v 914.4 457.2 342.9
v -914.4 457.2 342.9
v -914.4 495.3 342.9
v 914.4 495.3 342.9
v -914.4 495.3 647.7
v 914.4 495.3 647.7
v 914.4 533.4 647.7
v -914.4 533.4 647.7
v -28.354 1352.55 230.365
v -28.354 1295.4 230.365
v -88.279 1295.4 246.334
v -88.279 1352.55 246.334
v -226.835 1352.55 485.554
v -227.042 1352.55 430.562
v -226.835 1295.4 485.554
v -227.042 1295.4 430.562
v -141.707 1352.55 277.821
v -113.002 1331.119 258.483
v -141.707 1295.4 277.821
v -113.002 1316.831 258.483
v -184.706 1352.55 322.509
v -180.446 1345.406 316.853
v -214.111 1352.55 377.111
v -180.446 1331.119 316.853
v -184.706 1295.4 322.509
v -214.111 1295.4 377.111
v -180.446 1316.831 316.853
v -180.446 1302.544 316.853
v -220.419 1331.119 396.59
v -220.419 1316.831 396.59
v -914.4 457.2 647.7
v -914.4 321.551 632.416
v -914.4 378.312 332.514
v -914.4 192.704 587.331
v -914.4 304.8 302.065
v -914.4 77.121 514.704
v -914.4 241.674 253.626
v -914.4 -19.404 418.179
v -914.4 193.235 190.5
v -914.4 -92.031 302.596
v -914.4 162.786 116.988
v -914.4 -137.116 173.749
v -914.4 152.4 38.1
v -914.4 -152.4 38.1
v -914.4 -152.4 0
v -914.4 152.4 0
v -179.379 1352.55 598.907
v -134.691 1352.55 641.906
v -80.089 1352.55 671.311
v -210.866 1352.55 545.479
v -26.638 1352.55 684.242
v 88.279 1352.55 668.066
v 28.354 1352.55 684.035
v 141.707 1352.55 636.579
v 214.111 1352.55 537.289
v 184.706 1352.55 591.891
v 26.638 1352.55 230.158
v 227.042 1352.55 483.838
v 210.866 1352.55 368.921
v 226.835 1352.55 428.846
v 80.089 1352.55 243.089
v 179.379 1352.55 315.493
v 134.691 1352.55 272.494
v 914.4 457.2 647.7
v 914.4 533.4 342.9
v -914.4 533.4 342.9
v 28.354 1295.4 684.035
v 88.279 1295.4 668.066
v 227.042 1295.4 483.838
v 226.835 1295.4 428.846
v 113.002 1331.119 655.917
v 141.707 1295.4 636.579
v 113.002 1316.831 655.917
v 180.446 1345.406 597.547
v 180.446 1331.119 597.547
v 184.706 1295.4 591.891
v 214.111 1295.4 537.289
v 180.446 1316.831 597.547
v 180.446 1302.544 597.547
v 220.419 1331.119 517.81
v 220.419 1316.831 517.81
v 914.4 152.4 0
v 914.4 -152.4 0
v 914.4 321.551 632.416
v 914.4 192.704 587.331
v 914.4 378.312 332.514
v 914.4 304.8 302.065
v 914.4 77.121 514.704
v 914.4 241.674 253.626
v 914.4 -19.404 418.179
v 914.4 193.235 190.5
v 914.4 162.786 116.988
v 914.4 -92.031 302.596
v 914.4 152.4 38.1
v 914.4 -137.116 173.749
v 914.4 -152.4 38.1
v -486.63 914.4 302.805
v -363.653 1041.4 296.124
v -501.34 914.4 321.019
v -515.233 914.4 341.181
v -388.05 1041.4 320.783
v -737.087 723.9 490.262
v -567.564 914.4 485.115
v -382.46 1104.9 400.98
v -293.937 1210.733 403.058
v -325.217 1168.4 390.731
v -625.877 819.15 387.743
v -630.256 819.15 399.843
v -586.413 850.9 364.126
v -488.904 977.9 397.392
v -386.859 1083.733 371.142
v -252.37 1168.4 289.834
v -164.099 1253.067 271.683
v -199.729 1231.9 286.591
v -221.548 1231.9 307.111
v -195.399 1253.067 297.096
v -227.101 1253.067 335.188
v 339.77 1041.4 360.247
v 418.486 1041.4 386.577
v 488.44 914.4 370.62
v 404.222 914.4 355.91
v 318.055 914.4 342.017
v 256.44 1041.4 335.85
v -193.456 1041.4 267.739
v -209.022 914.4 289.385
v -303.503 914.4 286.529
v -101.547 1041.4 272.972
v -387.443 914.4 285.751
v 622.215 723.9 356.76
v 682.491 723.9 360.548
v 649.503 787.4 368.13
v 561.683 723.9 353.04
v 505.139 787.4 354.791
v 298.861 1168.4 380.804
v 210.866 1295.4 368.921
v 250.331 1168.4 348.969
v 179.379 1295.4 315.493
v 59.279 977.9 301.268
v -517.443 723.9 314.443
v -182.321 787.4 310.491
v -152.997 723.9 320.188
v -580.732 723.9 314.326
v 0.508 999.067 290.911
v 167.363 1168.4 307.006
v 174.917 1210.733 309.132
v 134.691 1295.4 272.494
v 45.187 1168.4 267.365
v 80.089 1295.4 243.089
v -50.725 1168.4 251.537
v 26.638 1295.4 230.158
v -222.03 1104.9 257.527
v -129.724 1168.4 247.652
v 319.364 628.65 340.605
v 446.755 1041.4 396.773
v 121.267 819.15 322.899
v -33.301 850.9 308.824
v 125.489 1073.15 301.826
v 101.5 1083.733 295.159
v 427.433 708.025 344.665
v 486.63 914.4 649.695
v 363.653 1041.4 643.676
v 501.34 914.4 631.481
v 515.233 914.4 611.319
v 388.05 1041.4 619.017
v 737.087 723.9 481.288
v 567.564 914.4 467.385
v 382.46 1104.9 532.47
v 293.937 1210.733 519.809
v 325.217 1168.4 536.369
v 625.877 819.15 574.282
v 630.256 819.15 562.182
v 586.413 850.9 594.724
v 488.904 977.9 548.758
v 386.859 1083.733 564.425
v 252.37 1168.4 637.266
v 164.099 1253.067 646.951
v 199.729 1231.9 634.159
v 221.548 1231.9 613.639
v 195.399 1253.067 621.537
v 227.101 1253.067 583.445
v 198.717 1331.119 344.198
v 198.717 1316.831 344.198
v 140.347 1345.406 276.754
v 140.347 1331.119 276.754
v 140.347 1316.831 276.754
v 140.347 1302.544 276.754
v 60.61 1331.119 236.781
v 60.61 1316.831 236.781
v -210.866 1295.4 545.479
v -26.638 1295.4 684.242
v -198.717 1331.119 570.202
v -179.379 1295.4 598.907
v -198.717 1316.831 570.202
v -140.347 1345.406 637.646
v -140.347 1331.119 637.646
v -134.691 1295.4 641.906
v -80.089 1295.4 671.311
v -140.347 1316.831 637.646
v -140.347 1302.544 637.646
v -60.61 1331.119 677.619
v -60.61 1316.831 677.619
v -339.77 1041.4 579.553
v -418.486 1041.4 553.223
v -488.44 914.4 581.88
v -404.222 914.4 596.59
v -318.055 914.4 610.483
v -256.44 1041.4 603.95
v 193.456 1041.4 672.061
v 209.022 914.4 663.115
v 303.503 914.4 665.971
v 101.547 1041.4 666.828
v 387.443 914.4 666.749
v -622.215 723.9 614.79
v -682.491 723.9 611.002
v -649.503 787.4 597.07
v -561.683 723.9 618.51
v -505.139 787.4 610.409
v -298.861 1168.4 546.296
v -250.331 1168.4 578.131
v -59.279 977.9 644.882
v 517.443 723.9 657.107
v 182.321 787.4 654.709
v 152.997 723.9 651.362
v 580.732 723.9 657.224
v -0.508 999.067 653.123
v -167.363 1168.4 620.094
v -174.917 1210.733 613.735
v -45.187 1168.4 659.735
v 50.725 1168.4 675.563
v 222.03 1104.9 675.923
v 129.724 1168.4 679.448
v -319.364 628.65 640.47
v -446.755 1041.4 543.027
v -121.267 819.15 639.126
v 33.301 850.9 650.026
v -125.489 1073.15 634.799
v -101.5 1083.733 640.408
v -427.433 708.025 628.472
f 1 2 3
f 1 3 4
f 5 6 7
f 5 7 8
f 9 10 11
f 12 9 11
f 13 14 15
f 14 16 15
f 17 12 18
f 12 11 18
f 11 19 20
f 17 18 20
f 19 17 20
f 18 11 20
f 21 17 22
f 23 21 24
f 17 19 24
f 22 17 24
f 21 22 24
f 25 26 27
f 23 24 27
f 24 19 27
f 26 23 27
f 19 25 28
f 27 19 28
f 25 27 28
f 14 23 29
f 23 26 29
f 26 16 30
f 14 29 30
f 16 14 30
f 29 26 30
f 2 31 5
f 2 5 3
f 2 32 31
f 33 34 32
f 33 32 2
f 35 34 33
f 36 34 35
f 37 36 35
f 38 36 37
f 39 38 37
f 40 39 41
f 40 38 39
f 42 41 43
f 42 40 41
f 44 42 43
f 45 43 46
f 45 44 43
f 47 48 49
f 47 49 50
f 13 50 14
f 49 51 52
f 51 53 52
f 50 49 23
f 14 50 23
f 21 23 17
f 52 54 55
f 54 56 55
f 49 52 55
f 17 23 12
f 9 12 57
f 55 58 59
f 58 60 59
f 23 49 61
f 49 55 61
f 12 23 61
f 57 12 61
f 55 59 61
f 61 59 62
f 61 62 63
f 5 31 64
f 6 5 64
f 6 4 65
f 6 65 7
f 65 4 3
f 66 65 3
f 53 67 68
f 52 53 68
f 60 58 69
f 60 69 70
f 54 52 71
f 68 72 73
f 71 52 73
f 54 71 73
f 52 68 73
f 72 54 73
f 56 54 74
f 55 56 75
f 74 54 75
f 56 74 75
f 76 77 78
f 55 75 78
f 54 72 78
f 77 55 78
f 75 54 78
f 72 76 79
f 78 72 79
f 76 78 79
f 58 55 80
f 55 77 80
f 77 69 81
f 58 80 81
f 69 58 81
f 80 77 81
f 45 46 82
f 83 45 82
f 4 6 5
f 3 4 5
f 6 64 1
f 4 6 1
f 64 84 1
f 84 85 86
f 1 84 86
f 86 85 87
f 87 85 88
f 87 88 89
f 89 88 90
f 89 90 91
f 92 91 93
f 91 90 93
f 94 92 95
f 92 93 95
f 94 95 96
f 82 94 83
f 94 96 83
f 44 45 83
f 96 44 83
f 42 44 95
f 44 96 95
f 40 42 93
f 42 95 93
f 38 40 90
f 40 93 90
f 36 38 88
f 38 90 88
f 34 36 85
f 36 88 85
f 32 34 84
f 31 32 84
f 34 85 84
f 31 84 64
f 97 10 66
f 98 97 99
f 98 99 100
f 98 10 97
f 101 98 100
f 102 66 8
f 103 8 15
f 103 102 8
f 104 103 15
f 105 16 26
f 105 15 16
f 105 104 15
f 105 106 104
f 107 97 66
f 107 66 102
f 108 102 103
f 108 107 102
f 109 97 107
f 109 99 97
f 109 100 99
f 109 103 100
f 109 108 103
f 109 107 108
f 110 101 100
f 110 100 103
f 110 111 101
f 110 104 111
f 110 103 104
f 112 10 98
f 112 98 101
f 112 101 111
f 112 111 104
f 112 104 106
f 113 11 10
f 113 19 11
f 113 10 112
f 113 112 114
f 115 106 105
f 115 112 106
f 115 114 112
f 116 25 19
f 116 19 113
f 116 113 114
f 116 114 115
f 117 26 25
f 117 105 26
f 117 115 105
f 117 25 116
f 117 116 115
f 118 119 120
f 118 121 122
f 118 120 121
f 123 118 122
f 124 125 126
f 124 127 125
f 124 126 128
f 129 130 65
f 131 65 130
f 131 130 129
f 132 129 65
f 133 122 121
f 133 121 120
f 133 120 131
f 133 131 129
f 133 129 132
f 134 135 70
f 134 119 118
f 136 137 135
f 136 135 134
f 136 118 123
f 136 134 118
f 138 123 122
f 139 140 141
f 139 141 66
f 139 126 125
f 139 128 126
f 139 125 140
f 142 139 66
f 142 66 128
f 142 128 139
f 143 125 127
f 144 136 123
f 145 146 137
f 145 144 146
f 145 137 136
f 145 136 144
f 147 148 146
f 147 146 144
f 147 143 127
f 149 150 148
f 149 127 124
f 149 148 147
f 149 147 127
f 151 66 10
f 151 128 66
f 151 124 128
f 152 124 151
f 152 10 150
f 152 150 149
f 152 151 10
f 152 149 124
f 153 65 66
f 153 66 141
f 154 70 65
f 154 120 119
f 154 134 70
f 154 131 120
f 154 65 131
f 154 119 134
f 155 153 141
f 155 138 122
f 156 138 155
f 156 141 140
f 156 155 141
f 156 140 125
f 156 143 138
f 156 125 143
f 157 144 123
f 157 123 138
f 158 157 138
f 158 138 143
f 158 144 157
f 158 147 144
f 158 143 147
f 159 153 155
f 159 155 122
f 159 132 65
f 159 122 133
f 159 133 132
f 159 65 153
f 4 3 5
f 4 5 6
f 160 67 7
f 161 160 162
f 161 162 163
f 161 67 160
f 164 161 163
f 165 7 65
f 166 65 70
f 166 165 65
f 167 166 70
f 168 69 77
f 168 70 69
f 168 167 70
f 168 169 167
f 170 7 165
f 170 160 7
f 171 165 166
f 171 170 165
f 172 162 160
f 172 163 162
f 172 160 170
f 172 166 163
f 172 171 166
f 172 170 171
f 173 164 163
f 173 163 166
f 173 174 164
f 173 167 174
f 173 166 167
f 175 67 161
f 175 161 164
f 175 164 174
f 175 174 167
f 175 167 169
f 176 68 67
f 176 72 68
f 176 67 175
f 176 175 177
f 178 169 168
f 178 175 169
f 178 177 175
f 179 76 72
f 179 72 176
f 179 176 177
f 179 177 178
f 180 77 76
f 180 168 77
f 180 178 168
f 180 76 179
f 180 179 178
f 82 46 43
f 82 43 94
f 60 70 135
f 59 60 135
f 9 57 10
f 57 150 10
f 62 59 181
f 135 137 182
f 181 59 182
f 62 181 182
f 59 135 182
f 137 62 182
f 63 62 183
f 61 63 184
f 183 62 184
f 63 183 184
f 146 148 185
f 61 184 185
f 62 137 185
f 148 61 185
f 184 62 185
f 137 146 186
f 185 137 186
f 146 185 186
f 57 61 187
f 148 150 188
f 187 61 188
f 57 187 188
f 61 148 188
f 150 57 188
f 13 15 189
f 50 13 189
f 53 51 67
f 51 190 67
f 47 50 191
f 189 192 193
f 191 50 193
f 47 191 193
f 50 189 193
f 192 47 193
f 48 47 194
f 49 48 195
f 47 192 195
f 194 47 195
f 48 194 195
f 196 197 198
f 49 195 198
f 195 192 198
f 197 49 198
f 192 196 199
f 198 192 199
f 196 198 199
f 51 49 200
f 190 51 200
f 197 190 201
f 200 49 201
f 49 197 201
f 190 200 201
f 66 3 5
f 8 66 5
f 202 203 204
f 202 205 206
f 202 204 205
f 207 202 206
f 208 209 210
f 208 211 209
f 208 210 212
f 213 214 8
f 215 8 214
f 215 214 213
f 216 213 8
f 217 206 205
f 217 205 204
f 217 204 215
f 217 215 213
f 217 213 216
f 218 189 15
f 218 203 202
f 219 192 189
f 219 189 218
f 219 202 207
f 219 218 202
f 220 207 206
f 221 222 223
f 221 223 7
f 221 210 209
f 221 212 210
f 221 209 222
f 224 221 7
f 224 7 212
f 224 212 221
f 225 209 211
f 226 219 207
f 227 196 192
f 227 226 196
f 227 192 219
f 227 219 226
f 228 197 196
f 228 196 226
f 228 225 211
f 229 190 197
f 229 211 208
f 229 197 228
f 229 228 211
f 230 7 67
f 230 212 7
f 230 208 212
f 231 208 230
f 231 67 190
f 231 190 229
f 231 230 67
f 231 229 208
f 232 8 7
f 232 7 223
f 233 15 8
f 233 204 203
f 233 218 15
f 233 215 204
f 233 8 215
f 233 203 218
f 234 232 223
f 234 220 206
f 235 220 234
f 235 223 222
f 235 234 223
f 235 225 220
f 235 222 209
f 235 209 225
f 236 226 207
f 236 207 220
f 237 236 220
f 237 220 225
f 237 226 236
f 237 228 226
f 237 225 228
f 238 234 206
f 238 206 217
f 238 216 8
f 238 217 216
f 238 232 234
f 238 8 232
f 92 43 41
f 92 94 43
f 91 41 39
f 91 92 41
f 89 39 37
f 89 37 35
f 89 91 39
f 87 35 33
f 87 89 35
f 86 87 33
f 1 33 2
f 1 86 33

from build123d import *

# Parameters (mm, degrees)
F0_W      = 1828.8
F0_H      = 304.8
F1_DEPTH  = 38.1
F2_W      = 1828.8
F2_H      = 304.8
F3_ANGLE  = 90
F4_DEPTH  = 38.1
F5_W      = 1828.8
F5_H      = 304.8
F6_DEPTH  = 38.1
F6_FACE_W = 1828.8
F6_FACE_H = 304.8
F10_DEPTH = 57.15


# Not quite as in the source:
# - the arcs of a loft's sections are written as splines that run evenly, so that the points pair up as in the source's solid


with BuildPart() as f1:
    # F0 (on Top) → F1 (new body)
    with BuildSketch(Plane.XY):
        Rectangle(F0_W, F0_H)
    extrude(amount=F1_DEPTH)

    # F2 (on face) → F3 (revolve)
    with BuildSketch(Plane.XY.offset(38.1)):
        Rectangle(F2_W, F2_H)
    revolve(axis=Axis((-103.2055318356, 457.2, 38.1), (-1, 0, 0)), revolution_arc=F3_ANGLE)

    # F4 (add): a face of the model
    f4_faces = [f1.faces().sort_by_distance(p)[0] for p in [
        (0, 457.2, 495.3),
    ]]
    extrude(f4_faces, amount=F4_DEPTH)


with BuildPart() as f6:
    # F5 (on face) → F6 (new body)
    with BuildSketch(Plane(origin=(0, 495.3, 0), x_dir=(-1, 0, 0), z_dir=(0, 1, 0))):
        with Locations((0, 495.3)):
            Rectangle(F5_W, F5_H)
    extrude(amount=F6_DEPTH)

    # F6_face (on face) → F9 section 0
    with BuildSketch(Plane(origin=(0, 533.4, 495.3), x_dir=(-1, 0, 0), z_dir=(0, 1, 0))):
        Rectangle(F6_FACE_W, F6_FACE_H)
    # F8 (on offset) → F9 section 1
    with BuildSketch(Plane(origin=(0, 1295.4, 0), x_dir=(-1, 0, 0), z_dir=(0, 1, 0))):
        with BuildLine():
            add(Edge.make_bspline(
                [(-226.8347226167, 428.8456596729), (-224.978935382, 413.9993617947), (-221.6609974791, 399.3362055901), (-212.2280018047, 370.9382369937), (-206.1131772825, 357.2041267978), (-191.3212651368, 331.1921033689), (-182.6445432725, 318.9148333344), (-163.062159544, 296.2883825456), (-152.1569818928, 285.9397612748), (-128.5366666062, 267.5684049408), (-115.8221130296, 259.5461241455), (-89.0715816549, 246.1358631874), (-75.0362653164, 240.7482146197), (-46.1835257726, 232.8143978457), (-31.366816008, 230.2684258186), (-1.5206628948, 228.1159453578), (13.5080424489, 228.5094901485), (28.3543403271, 230.3652773833)],
                knots=[0, 0, 0, 0, 0.125, 0.125, 0.25, 0.25, 0.375, 0.375, 0.5, 0.5, 0.625, 0.625, 0.75, 0.75, 0.875, 0.875, 1, 1, 1, 1], degree=3))
            add(Edge.make_bspline(
                [(28.3543403271, 230.3652773833), (43.2006382053, 232.221064618), (57.8637944099, 235.5390025209), (86.2617630063, 244.9719981953), (99.9958732022, 251.0868227175), (126.0078966311, 265.8787348632), (138.2851666656, 274.5554567275), (160.9116174544, 294.137840456), (171.2602387252, 305.0430181072), (189.6315950592, 328.6633333938), (197.6538758545, 341.3778869704), (211.0641368126, 368.1284183451), (216.4517853803, 382.1637346836), (224.3856021543, 411.0164742274), (226.9315741814, 425.833183992), (229.0840546422, 455.6793371052), (228.6905098515, 470.7080424489), (226.8347226167, 485.5543403271)],
                knots=[0, 0, 0, 0, 0.125, 0.125, 0.25, 0.25, 0.375, 0.375, 0.5, 0.5, 0.625, 0.625, 0.75, 0.75, 0.875, 0.875, 1, 1, 1, 1], degree=3))
            add(Edge.make_bspline(
                [(226.8347226167, 485.5543403271), (224.978935382, 500.4006382053), (221.6609974791, 515.0637944099), (212.2280018047, 543.4617630063), (206.1131772825, 557.1958732022), (191.3212651368, 583.2078966311), (182.6445432725, 595.4851666656), (163.062159544, 618.1116174544), (152.1569818928, 628.4602387252), (128.5366666062, 646.8315950592), (115.8221130296, 654.8538758545), (89.0715816549, 668.2641368126), (75.0362653164, 673.6517853803), (46.1835257726, 681.5856021543), (31.366816008, 684.1315741814), (1.5206628948, 686.2840546422), (-13.5080424489, 685.8905098515), (-28.3543403271, 684.0347226167)],
                knots=[0, 0, 0, 0, 0.125, 0.125, 0.25, 0.25, 0.375, 0.375, 0.5, 0.5, 0.625, 0.625, 0.75, 0.75, 0.875, 0.875, 1, 1, 1, 1], degree=3))
            add(Edge.make_bspline(
                [(-28.3543403271, 684.0347226167), (-43.2006382053, 682.178935382), (-57.8637944099, 678.8609974791), (-86.2617630063, 669.4280018047), (-99.9958732022, 663.3131772825), (-126.0078966311, 648.5212651368), (-138.2851666656, 639.8445432725), (-160.9116174544, 620.262159544), (-171.2602387252, 609.3569818928), (-189.6315950592, 585.7366666062), (-197.6538758545, 573.0221130296), (-211.0641368126, 546.2715816549), (-216.4517853803, 532.2362653164), (-224.3856021543, 503.3835257726), (-226.9315741814, 488.566816008), (-229.0840546422, 458.7206628948), (-228.6905098515, 443.6919575511), (-226.8347226167, 428.8456596729)],
                knots=[0, 0, 0, 0, 0.125, 0.125, 0.25, 0.25, 0.375, 0.375, 0.5, 0.5, 0.625, 0.625, 0.75, 0.75, 0.875, 0.875, 1, 1, 1, 1], degree=3))
        make_face()
    loft(ruled=True)

    # F10 (add): a face of the model
    f10_faces = [f6.faces().sort_by_distance(p)[0] for p in [
        (0, 1295.4, 457.2),
    ]]
    extrude(f10_faces, amount=F10_DEPTH)


solid = Compound([f1.part, f6.part])
